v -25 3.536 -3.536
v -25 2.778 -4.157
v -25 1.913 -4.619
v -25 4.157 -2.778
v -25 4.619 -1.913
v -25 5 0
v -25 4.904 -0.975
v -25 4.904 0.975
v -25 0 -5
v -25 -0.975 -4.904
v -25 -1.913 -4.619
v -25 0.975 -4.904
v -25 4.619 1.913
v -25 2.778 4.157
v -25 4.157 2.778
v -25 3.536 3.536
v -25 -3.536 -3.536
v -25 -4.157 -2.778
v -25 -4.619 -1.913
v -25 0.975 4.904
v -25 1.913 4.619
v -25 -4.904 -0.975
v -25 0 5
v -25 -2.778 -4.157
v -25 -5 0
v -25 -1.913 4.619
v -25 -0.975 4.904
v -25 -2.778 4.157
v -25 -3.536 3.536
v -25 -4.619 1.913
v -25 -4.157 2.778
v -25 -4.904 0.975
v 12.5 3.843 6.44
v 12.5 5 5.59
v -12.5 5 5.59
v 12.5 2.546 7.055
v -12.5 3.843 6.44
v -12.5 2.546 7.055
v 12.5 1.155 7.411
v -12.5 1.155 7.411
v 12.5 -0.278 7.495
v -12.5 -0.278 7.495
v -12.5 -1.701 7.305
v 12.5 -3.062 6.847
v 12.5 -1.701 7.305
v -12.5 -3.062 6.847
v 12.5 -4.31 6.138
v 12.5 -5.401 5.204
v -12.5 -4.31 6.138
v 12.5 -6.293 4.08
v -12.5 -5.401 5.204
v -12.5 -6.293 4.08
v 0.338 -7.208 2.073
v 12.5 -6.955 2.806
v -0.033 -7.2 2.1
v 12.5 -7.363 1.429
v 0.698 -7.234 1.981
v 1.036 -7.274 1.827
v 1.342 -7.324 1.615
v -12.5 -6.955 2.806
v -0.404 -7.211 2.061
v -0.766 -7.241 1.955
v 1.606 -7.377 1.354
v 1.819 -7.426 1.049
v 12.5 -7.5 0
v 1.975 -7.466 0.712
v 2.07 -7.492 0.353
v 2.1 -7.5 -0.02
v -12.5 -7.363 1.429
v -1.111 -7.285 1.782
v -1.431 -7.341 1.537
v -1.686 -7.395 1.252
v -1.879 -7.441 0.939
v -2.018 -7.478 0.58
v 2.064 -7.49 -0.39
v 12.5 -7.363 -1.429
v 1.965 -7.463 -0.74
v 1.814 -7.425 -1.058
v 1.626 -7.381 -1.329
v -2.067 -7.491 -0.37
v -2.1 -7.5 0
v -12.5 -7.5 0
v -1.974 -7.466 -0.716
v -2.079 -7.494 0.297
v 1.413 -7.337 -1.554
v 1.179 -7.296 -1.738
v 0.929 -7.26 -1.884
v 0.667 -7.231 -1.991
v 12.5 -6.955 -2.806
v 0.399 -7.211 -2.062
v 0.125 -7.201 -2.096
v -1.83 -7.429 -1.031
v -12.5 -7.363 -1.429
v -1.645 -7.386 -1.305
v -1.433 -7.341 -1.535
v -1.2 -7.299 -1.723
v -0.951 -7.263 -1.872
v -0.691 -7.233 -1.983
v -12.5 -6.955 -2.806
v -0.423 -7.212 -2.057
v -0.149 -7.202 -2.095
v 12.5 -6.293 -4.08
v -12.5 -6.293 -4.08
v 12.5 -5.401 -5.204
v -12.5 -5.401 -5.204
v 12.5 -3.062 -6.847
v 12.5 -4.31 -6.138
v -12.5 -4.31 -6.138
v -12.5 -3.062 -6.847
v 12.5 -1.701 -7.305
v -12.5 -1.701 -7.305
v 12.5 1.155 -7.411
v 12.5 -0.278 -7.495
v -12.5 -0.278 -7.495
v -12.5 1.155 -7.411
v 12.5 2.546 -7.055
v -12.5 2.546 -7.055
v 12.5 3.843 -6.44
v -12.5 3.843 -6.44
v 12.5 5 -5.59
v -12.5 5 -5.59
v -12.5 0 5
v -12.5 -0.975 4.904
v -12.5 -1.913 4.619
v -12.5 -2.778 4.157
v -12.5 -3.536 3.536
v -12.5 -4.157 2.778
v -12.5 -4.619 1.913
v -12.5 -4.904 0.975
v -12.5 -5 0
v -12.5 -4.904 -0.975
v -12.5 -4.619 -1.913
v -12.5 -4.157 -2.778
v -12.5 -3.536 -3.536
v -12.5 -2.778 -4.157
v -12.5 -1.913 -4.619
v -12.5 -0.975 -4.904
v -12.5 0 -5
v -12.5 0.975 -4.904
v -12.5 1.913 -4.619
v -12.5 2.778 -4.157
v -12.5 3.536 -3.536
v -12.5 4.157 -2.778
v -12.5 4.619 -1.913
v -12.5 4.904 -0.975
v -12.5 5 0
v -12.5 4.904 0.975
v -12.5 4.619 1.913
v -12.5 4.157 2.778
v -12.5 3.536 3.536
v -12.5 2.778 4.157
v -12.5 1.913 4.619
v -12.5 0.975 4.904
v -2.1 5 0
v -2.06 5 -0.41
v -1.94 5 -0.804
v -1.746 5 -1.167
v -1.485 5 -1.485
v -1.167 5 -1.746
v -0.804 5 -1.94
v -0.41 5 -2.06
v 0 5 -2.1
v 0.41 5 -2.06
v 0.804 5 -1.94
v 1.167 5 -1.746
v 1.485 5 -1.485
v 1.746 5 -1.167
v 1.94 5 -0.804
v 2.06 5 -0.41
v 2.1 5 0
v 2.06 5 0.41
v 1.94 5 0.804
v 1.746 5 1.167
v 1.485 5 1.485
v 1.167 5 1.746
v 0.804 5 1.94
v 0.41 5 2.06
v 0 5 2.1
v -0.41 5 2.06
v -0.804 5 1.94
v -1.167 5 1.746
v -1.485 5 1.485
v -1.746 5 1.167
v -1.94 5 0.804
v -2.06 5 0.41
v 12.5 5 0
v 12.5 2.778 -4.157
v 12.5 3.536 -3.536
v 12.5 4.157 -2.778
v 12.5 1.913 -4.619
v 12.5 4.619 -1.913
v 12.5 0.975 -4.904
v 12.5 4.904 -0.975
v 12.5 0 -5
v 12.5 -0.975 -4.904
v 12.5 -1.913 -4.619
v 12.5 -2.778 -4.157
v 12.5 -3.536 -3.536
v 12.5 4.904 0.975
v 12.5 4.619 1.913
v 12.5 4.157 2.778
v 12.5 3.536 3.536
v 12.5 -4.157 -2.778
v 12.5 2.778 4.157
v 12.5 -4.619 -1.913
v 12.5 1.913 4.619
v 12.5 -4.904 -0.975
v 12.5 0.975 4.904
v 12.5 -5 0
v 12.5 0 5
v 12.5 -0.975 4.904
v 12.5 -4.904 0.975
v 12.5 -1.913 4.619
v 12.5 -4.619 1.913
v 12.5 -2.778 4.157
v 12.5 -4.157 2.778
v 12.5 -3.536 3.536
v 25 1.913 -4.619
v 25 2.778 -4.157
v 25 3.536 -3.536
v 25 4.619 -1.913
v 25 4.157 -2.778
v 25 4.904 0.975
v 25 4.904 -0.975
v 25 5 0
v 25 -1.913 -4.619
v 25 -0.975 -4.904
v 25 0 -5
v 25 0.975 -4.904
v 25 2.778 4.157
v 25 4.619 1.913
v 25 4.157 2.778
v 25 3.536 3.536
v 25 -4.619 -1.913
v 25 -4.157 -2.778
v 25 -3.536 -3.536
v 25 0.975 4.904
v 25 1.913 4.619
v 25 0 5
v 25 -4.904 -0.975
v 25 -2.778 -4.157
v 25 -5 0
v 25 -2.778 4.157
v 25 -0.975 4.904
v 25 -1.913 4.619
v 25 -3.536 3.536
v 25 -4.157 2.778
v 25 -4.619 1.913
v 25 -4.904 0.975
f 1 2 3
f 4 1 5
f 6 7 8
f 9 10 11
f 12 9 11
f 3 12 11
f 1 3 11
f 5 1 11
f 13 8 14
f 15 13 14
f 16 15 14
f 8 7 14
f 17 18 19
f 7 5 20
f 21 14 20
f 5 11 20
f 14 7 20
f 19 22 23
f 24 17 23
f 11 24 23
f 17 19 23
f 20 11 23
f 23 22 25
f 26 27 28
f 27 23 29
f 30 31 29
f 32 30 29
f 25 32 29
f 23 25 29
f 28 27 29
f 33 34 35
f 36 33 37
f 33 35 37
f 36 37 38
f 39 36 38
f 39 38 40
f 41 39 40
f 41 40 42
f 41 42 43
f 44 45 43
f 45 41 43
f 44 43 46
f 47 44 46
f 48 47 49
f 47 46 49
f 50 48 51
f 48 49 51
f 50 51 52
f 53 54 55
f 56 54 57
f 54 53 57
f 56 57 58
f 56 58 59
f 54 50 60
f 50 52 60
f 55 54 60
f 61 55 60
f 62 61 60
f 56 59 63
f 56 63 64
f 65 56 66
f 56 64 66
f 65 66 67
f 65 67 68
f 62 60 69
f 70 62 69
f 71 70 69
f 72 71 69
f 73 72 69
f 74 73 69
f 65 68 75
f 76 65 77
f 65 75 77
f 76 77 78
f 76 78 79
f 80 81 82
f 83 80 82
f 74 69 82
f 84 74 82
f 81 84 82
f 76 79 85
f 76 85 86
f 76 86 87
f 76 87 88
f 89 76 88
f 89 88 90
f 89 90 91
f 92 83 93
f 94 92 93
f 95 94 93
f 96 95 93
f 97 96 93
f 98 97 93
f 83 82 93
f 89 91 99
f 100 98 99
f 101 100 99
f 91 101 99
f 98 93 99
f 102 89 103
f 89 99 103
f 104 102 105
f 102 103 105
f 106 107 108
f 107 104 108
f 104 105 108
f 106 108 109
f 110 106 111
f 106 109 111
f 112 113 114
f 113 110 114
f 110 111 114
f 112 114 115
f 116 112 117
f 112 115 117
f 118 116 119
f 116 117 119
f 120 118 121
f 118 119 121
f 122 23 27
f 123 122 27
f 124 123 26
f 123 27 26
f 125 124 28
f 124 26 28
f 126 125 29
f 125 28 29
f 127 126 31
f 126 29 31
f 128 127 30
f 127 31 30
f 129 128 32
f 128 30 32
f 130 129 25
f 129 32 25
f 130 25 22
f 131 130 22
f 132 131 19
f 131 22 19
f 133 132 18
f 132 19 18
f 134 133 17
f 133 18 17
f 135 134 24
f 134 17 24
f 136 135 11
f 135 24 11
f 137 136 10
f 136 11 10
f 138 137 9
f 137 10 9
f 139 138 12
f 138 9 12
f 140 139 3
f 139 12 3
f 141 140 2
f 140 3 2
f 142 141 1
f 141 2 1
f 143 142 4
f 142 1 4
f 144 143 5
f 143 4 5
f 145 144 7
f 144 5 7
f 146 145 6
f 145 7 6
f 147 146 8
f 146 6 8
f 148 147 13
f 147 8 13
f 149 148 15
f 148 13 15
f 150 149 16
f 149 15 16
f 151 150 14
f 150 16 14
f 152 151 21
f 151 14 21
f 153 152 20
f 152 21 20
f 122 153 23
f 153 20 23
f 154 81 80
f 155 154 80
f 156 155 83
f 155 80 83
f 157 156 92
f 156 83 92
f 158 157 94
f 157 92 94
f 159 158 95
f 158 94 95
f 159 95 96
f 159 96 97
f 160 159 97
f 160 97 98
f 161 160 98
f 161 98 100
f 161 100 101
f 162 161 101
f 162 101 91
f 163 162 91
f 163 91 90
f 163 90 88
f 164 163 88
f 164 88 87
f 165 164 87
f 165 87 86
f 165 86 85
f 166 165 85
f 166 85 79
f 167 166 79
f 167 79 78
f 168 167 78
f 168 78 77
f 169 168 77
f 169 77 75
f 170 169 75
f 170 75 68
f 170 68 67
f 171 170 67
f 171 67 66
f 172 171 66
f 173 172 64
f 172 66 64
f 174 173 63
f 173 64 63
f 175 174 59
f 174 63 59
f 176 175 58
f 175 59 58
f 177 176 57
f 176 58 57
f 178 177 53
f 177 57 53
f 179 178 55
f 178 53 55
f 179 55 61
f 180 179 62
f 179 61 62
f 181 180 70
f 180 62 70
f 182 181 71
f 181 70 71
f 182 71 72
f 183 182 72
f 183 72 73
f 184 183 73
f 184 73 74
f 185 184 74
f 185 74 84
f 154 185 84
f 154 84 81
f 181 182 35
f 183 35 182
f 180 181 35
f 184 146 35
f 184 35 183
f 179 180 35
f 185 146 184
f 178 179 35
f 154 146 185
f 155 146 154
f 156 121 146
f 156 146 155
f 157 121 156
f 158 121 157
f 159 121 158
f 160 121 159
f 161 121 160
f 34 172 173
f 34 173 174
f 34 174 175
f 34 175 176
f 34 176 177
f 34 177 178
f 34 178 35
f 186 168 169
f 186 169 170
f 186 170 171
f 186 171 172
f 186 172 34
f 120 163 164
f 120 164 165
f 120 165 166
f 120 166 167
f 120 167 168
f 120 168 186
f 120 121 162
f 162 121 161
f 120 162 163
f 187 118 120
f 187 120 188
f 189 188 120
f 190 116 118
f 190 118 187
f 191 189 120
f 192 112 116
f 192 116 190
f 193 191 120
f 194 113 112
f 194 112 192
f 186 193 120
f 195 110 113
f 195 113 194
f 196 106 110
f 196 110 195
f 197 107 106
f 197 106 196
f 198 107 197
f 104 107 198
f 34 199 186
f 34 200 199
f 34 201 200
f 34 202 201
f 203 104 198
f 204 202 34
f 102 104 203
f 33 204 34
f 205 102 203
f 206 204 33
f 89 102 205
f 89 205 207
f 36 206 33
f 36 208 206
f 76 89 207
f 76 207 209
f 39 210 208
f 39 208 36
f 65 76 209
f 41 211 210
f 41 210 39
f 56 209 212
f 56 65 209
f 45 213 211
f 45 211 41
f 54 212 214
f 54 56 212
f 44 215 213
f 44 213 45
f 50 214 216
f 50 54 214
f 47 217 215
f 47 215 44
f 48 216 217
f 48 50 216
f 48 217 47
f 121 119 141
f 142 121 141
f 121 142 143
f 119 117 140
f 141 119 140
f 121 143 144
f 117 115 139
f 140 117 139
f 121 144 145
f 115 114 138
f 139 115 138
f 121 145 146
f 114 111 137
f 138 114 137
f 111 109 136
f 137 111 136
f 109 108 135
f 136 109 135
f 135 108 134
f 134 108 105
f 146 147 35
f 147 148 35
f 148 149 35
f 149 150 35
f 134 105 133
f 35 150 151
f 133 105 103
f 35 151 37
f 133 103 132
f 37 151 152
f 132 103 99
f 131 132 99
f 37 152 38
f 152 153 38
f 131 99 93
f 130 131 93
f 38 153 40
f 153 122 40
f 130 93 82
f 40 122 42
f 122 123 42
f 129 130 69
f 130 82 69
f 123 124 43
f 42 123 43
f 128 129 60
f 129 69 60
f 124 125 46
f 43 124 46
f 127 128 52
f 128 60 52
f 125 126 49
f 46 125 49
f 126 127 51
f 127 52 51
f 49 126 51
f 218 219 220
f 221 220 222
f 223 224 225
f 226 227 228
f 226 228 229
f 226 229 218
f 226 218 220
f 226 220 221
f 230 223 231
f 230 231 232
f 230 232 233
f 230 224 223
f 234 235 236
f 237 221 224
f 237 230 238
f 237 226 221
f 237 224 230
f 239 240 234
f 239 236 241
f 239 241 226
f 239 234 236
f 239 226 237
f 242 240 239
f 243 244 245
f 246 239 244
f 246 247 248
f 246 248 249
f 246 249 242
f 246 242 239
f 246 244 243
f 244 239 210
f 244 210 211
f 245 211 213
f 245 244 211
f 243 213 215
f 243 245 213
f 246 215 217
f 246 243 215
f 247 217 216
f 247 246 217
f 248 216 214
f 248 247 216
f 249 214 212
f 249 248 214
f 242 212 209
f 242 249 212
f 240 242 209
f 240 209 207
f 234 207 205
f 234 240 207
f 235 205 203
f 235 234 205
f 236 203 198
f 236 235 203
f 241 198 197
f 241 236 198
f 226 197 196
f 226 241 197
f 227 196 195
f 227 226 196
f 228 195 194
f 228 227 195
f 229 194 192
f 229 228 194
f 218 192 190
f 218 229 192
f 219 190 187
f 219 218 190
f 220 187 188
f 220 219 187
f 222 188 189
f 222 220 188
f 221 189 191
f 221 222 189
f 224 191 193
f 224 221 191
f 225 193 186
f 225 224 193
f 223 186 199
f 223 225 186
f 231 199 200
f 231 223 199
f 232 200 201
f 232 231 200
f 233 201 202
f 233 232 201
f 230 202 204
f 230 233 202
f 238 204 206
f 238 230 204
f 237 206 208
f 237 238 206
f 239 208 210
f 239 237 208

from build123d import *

# Parameters (mm, degrees)
CUT_EXTRUDE_START   = 5
SKETCH_2_W          = 25
SKETCH_2_H          = 23.22226429
CUT_EXTRUDE_1_DEPTH = 23.156951228
HOLE_WIZARD_M5_1_D  = 4.2


with BuildPart() as part:
    # 草图1 → 旋转1 (revolve)
    with BuildSketch(Plane.XY, mode=Mode.PRIVATE) as revolve_1_sk:
        Polygon((0, 7.5), (12.5, 7.5), (12.5, 5), (25, 5), (25, 0), (0, 0), align=None)
    revolve_1 = revolve(revolve_1_sk.sketch.rotate(Axis((0, 0, 0), (1, 0, 0)), 90), axis=Axis((0, 0, 0), (1, 0, 0)))

    # 镜向1: 旋转1 across plane
    add(revolve_1.mirror(Plane(origin=(0, 0, 0), x_dir=(0, 0, 1), z_dir=(1, 0, 0))))

    # 草图2 → 切除-拉伸1 (cut, through all)
    with BuildSketch(Plane(origin=(0, 0, 0), x_dir=(1, 0, 0), z_dir=(0, 1, 0)).offset(CUT_EXTRUDE_START)):
        Rectangle(SKETCH_2_W, SKETCH_2_H)
    extrude(amount=CUT_EXTRUDE_1_DEPTH, mode=Mode.SUBTRACT)

    # M5 螺纹孔的螺纹孔钻头1 (through all)
    with Locations(Plane(origin=(0, 5, 0), x_dir=(1, 0, 0), z_dir=(0, 1, 0))):
        with Locations((0, 0)):
            Hole(HOLE_WIZARD_M5_1_D / 2)


solid = part.part
